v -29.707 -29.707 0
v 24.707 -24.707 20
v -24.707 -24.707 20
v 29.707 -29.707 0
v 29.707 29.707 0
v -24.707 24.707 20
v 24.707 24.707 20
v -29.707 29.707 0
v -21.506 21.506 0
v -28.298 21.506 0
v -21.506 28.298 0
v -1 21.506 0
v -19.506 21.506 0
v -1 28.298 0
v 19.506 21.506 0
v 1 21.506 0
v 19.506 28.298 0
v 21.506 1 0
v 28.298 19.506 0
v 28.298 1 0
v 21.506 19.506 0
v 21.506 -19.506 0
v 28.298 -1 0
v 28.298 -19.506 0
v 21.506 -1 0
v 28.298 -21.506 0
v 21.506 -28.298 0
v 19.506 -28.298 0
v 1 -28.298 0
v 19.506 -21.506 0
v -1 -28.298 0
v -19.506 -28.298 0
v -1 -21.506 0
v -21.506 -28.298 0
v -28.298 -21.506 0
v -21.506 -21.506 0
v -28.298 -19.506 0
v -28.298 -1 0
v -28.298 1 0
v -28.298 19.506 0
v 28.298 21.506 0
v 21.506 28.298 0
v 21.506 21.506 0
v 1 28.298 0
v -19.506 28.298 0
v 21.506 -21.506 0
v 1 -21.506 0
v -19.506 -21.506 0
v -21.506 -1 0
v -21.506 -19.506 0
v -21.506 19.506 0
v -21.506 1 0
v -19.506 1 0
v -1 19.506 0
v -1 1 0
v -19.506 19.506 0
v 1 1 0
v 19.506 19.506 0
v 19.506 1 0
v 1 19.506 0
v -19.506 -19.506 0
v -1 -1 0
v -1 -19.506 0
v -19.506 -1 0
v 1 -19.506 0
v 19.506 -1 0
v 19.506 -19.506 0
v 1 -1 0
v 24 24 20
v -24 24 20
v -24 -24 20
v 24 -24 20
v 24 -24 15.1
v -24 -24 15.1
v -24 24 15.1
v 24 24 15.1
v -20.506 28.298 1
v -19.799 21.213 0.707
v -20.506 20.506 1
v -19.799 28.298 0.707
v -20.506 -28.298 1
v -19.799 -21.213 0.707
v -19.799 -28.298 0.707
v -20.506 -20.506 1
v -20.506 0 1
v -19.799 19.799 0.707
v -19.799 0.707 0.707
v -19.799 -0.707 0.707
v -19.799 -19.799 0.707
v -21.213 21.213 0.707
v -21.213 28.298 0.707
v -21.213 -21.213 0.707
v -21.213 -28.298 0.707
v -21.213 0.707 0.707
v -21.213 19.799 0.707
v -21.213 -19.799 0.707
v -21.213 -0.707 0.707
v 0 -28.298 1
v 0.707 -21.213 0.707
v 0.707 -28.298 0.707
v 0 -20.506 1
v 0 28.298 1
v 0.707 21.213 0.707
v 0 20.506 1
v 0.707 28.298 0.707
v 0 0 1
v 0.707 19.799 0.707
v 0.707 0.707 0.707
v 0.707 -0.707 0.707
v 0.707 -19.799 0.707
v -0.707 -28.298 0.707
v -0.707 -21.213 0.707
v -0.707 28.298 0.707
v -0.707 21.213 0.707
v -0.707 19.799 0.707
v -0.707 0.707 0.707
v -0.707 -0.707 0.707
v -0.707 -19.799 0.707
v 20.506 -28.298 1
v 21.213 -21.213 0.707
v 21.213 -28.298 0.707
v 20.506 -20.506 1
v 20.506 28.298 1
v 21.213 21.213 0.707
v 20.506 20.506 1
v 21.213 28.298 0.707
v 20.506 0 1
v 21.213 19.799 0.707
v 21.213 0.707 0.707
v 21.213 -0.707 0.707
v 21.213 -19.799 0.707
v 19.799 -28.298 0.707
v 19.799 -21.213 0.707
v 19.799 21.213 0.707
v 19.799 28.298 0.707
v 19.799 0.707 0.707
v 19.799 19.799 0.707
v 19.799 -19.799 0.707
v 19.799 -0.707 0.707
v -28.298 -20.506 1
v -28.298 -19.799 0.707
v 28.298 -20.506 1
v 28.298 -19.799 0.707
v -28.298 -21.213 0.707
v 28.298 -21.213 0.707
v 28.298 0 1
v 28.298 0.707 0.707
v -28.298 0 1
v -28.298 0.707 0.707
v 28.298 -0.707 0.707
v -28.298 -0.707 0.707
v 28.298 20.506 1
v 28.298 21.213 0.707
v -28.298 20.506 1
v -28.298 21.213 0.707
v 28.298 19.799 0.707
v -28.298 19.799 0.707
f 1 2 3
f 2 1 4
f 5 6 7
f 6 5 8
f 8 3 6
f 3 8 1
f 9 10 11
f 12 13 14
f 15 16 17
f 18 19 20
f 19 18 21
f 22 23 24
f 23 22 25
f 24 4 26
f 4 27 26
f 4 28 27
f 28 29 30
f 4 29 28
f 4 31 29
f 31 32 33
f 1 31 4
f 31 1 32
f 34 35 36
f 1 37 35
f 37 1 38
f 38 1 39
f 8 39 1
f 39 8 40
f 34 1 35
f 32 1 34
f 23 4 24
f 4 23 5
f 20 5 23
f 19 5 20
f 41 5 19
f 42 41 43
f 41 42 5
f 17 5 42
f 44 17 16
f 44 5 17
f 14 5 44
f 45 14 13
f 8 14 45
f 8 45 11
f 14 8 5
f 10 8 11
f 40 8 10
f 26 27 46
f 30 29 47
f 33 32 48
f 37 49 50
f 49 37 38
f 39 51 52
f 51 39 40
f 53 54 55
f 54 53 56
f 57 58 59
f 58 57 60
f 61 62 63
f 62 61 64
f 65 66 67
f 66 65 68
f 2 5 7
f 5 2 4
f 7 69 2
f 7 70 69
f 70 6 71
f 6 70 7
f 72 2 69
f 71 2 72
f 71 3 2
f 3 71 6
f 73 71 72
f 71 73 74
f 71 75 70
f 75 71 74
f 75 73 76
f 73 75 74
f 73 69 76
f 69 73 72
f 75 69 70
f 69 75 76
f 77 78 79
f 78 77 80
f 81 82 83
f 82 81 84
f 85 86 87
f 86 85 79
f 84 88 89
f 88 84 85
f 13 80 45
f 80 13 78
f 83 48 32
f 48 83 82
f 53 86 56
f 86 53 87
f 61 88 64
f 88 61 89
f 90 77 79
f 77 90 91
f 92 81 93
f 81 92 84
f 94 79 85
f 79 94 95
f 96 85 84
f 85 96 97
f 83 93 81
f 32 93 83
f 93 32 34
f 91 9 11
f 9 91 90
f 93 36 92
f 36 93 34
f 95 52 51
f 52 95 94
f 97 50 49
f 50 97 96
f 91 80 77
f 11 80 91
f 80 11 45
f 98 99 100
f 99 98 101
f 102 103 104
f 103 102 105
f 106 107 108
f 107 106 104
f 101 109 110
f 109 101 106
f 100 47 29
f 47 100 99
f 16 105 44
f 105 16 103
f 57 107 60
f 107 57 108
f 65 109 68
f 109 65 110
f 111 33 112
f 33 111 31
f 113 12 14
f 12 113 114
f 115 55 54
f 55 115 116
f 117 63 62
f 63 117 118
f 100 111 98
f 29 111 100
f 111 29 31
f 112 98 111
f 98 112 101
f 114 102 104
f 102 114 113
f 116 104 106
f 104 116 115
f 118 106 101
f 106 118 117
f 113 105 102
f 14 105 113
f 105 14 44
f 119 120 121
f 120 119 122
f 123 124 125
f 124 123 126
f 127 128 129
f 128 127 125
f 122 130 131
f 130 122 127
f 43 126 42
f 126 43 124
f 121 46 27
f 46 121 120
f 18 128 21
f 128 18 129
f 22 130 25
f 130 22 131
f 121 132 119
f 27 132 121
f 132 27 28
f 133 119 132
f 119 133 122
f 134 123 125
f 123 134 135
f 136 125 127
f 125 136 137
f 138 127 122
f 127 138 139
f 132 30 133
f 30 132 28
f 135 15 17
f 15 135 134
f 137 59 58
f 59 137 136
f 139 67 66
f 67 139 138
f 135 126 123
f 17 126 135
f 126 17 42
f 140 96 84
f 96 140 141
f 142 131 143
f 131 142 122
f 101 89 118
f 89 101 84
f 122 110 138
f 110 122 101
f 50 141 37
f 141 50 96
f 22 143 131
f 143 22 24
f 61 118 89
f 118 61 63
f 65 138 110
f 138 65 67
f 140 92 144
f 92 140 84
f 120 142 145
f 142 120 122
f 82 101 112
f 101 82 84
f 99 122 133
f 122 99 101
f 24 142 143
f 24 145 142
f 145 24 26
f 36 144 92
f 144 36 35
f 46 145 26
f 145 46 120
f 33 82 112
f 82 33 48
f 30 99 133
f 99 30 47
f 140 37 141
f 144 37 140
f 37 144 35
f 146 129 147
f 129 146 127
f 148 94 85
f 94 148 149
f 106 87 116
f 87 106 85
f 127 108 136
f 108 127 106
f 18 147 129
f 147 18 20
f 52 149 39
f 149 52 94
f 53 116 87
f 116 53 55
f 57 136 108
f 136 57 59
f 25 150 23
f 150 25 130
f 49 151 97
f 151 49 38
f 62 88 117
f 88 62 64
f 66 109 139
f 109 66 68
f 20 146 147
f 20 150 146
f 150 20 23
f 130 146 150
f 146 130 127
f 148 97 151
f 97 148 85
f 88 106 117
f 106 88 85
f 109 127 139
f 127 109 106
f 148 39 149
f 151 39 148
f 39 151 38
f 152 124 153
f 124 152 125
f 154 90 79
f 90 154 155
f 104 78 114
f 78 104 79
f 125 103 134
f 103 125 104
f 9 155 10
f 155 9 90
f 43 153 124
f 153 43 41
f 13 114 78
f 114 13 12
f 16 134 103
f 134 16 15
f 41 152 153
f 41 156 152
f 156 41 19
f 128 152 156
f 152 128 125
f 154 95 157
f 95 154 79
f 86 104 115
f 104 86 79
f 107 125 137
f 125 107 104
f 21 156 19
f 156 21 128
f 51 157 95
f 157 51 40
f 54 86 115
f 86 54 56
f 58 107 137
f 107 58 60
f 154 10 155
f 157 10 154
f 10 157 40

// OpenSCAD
/* Furniture leg riser
 * Copyright 2013, Robert Carlsen
 *
 * This program is free software: you can redistribute it and/or modify
 * it under the terms of the GNU General Public License as published by
 * the Free Software Foundation, either version 3 of the License, or
 * (at your option) any later version.
 *
 * This program is distributed in the hope that it will be useful,
 * but WITHOUT ANY WARRANTY; without even the implied warranty of
 * MERCHANTABILITY or FITNESS FOR A PARTICULAR PURPOSE.  See the
 * GNU General Public License for more details.
 *
 * You should have received a copy of the GNU General Public License
 * along with this program.  If not, see <http://www.gnu.org/licenses/>.
 *
 */

// riser for furniture legs
// all measurements in mm
// adopted for Thingiverse Customizer

// not used for the Customizer
// clearance for Mint robot with our couch:
//couchHeightFront =  15;
//couchBaseWidth = 75;
//tvBaseWidth = 48;


// Height of the riser
platformHeight = 15; 

// Width of the riser platform
platformWidth = 48;

// How much the base flares out for stability
baseFlare = 10;
baseWidth = platformWidth+baseFlare;

// Lip height around the platform
lipHeight = 5; // [0:10]

// Thickness of the lip at the top
lipWidth = 1; // [0:10]

// Include stress relief channels on the first few layers?
useStressRelief = "Yes"; // [Yes,No]

// sanity checking...just make sure the platform will be the correct size
//cube([platformWidth, platformWidth, 2], center=true);

// this is the riser
module riser(_platformSize, _baseSize, _height, _lipHeight, _lipWidth) {

  // calculate the sizes needed for the pyramid
  // since we're faking the cube with a cylinder, find the chord length
  _baseRadius=radiusFromChord(_baseSize);
  _platformRadius=radiusFromChord(_platformSize);

  difference() {
    rotate([0,0,45])
    difference() {
      cylinder(h=_height+_lipHeight, r1=_baseRadius+_lipWidth, r2=_platformRadius+_lipWidth, $fn=4);
      translate([0,0,_height+0.1])

      // the platform is just a regular cube subtracted from the pyramid
      rotate([0,0,45])
      translate([0,0,_lipHeight/2])
      cube([_platformSize,_platformSize,_lipHeight],center=true);
    }

    // carves out channels on the bottom of the riser to
    // minimize curling of the cooling ABS.
    // you can likely disable these if using PLA:
    if(useStressRelief == "Yes") {
      stressRelief(_baseRadius);
      rotate([0,0,90])
      stressRelief(_baseRadius);
    }
  }
}

// need to carve stress relief in the bottom
// or the plastic will warp and pull up the
// build plate while cooling.
module stressRelief(_baseSize) {
  rotate([90,0,0])
  for (x = [-_baseSize/2 : _baseSize/2 : _baseSize/2])
  {
      translate([x, 0, 0])
      // using a low res cylinder is a poor-man's teardrop
      cylinder(h=_baseSize*1.38, r=1, center=true,$fn=8);
  }
}

function radiusFromChord(_chordLength) = pow(pow(_chordLength/2,2)+pow(_chordLength/2,2), 0.5);

// generate the riser using the above module(s):
riser(platformWidth, baseWidth, platformHeight, lipHeight, lipWidth);
